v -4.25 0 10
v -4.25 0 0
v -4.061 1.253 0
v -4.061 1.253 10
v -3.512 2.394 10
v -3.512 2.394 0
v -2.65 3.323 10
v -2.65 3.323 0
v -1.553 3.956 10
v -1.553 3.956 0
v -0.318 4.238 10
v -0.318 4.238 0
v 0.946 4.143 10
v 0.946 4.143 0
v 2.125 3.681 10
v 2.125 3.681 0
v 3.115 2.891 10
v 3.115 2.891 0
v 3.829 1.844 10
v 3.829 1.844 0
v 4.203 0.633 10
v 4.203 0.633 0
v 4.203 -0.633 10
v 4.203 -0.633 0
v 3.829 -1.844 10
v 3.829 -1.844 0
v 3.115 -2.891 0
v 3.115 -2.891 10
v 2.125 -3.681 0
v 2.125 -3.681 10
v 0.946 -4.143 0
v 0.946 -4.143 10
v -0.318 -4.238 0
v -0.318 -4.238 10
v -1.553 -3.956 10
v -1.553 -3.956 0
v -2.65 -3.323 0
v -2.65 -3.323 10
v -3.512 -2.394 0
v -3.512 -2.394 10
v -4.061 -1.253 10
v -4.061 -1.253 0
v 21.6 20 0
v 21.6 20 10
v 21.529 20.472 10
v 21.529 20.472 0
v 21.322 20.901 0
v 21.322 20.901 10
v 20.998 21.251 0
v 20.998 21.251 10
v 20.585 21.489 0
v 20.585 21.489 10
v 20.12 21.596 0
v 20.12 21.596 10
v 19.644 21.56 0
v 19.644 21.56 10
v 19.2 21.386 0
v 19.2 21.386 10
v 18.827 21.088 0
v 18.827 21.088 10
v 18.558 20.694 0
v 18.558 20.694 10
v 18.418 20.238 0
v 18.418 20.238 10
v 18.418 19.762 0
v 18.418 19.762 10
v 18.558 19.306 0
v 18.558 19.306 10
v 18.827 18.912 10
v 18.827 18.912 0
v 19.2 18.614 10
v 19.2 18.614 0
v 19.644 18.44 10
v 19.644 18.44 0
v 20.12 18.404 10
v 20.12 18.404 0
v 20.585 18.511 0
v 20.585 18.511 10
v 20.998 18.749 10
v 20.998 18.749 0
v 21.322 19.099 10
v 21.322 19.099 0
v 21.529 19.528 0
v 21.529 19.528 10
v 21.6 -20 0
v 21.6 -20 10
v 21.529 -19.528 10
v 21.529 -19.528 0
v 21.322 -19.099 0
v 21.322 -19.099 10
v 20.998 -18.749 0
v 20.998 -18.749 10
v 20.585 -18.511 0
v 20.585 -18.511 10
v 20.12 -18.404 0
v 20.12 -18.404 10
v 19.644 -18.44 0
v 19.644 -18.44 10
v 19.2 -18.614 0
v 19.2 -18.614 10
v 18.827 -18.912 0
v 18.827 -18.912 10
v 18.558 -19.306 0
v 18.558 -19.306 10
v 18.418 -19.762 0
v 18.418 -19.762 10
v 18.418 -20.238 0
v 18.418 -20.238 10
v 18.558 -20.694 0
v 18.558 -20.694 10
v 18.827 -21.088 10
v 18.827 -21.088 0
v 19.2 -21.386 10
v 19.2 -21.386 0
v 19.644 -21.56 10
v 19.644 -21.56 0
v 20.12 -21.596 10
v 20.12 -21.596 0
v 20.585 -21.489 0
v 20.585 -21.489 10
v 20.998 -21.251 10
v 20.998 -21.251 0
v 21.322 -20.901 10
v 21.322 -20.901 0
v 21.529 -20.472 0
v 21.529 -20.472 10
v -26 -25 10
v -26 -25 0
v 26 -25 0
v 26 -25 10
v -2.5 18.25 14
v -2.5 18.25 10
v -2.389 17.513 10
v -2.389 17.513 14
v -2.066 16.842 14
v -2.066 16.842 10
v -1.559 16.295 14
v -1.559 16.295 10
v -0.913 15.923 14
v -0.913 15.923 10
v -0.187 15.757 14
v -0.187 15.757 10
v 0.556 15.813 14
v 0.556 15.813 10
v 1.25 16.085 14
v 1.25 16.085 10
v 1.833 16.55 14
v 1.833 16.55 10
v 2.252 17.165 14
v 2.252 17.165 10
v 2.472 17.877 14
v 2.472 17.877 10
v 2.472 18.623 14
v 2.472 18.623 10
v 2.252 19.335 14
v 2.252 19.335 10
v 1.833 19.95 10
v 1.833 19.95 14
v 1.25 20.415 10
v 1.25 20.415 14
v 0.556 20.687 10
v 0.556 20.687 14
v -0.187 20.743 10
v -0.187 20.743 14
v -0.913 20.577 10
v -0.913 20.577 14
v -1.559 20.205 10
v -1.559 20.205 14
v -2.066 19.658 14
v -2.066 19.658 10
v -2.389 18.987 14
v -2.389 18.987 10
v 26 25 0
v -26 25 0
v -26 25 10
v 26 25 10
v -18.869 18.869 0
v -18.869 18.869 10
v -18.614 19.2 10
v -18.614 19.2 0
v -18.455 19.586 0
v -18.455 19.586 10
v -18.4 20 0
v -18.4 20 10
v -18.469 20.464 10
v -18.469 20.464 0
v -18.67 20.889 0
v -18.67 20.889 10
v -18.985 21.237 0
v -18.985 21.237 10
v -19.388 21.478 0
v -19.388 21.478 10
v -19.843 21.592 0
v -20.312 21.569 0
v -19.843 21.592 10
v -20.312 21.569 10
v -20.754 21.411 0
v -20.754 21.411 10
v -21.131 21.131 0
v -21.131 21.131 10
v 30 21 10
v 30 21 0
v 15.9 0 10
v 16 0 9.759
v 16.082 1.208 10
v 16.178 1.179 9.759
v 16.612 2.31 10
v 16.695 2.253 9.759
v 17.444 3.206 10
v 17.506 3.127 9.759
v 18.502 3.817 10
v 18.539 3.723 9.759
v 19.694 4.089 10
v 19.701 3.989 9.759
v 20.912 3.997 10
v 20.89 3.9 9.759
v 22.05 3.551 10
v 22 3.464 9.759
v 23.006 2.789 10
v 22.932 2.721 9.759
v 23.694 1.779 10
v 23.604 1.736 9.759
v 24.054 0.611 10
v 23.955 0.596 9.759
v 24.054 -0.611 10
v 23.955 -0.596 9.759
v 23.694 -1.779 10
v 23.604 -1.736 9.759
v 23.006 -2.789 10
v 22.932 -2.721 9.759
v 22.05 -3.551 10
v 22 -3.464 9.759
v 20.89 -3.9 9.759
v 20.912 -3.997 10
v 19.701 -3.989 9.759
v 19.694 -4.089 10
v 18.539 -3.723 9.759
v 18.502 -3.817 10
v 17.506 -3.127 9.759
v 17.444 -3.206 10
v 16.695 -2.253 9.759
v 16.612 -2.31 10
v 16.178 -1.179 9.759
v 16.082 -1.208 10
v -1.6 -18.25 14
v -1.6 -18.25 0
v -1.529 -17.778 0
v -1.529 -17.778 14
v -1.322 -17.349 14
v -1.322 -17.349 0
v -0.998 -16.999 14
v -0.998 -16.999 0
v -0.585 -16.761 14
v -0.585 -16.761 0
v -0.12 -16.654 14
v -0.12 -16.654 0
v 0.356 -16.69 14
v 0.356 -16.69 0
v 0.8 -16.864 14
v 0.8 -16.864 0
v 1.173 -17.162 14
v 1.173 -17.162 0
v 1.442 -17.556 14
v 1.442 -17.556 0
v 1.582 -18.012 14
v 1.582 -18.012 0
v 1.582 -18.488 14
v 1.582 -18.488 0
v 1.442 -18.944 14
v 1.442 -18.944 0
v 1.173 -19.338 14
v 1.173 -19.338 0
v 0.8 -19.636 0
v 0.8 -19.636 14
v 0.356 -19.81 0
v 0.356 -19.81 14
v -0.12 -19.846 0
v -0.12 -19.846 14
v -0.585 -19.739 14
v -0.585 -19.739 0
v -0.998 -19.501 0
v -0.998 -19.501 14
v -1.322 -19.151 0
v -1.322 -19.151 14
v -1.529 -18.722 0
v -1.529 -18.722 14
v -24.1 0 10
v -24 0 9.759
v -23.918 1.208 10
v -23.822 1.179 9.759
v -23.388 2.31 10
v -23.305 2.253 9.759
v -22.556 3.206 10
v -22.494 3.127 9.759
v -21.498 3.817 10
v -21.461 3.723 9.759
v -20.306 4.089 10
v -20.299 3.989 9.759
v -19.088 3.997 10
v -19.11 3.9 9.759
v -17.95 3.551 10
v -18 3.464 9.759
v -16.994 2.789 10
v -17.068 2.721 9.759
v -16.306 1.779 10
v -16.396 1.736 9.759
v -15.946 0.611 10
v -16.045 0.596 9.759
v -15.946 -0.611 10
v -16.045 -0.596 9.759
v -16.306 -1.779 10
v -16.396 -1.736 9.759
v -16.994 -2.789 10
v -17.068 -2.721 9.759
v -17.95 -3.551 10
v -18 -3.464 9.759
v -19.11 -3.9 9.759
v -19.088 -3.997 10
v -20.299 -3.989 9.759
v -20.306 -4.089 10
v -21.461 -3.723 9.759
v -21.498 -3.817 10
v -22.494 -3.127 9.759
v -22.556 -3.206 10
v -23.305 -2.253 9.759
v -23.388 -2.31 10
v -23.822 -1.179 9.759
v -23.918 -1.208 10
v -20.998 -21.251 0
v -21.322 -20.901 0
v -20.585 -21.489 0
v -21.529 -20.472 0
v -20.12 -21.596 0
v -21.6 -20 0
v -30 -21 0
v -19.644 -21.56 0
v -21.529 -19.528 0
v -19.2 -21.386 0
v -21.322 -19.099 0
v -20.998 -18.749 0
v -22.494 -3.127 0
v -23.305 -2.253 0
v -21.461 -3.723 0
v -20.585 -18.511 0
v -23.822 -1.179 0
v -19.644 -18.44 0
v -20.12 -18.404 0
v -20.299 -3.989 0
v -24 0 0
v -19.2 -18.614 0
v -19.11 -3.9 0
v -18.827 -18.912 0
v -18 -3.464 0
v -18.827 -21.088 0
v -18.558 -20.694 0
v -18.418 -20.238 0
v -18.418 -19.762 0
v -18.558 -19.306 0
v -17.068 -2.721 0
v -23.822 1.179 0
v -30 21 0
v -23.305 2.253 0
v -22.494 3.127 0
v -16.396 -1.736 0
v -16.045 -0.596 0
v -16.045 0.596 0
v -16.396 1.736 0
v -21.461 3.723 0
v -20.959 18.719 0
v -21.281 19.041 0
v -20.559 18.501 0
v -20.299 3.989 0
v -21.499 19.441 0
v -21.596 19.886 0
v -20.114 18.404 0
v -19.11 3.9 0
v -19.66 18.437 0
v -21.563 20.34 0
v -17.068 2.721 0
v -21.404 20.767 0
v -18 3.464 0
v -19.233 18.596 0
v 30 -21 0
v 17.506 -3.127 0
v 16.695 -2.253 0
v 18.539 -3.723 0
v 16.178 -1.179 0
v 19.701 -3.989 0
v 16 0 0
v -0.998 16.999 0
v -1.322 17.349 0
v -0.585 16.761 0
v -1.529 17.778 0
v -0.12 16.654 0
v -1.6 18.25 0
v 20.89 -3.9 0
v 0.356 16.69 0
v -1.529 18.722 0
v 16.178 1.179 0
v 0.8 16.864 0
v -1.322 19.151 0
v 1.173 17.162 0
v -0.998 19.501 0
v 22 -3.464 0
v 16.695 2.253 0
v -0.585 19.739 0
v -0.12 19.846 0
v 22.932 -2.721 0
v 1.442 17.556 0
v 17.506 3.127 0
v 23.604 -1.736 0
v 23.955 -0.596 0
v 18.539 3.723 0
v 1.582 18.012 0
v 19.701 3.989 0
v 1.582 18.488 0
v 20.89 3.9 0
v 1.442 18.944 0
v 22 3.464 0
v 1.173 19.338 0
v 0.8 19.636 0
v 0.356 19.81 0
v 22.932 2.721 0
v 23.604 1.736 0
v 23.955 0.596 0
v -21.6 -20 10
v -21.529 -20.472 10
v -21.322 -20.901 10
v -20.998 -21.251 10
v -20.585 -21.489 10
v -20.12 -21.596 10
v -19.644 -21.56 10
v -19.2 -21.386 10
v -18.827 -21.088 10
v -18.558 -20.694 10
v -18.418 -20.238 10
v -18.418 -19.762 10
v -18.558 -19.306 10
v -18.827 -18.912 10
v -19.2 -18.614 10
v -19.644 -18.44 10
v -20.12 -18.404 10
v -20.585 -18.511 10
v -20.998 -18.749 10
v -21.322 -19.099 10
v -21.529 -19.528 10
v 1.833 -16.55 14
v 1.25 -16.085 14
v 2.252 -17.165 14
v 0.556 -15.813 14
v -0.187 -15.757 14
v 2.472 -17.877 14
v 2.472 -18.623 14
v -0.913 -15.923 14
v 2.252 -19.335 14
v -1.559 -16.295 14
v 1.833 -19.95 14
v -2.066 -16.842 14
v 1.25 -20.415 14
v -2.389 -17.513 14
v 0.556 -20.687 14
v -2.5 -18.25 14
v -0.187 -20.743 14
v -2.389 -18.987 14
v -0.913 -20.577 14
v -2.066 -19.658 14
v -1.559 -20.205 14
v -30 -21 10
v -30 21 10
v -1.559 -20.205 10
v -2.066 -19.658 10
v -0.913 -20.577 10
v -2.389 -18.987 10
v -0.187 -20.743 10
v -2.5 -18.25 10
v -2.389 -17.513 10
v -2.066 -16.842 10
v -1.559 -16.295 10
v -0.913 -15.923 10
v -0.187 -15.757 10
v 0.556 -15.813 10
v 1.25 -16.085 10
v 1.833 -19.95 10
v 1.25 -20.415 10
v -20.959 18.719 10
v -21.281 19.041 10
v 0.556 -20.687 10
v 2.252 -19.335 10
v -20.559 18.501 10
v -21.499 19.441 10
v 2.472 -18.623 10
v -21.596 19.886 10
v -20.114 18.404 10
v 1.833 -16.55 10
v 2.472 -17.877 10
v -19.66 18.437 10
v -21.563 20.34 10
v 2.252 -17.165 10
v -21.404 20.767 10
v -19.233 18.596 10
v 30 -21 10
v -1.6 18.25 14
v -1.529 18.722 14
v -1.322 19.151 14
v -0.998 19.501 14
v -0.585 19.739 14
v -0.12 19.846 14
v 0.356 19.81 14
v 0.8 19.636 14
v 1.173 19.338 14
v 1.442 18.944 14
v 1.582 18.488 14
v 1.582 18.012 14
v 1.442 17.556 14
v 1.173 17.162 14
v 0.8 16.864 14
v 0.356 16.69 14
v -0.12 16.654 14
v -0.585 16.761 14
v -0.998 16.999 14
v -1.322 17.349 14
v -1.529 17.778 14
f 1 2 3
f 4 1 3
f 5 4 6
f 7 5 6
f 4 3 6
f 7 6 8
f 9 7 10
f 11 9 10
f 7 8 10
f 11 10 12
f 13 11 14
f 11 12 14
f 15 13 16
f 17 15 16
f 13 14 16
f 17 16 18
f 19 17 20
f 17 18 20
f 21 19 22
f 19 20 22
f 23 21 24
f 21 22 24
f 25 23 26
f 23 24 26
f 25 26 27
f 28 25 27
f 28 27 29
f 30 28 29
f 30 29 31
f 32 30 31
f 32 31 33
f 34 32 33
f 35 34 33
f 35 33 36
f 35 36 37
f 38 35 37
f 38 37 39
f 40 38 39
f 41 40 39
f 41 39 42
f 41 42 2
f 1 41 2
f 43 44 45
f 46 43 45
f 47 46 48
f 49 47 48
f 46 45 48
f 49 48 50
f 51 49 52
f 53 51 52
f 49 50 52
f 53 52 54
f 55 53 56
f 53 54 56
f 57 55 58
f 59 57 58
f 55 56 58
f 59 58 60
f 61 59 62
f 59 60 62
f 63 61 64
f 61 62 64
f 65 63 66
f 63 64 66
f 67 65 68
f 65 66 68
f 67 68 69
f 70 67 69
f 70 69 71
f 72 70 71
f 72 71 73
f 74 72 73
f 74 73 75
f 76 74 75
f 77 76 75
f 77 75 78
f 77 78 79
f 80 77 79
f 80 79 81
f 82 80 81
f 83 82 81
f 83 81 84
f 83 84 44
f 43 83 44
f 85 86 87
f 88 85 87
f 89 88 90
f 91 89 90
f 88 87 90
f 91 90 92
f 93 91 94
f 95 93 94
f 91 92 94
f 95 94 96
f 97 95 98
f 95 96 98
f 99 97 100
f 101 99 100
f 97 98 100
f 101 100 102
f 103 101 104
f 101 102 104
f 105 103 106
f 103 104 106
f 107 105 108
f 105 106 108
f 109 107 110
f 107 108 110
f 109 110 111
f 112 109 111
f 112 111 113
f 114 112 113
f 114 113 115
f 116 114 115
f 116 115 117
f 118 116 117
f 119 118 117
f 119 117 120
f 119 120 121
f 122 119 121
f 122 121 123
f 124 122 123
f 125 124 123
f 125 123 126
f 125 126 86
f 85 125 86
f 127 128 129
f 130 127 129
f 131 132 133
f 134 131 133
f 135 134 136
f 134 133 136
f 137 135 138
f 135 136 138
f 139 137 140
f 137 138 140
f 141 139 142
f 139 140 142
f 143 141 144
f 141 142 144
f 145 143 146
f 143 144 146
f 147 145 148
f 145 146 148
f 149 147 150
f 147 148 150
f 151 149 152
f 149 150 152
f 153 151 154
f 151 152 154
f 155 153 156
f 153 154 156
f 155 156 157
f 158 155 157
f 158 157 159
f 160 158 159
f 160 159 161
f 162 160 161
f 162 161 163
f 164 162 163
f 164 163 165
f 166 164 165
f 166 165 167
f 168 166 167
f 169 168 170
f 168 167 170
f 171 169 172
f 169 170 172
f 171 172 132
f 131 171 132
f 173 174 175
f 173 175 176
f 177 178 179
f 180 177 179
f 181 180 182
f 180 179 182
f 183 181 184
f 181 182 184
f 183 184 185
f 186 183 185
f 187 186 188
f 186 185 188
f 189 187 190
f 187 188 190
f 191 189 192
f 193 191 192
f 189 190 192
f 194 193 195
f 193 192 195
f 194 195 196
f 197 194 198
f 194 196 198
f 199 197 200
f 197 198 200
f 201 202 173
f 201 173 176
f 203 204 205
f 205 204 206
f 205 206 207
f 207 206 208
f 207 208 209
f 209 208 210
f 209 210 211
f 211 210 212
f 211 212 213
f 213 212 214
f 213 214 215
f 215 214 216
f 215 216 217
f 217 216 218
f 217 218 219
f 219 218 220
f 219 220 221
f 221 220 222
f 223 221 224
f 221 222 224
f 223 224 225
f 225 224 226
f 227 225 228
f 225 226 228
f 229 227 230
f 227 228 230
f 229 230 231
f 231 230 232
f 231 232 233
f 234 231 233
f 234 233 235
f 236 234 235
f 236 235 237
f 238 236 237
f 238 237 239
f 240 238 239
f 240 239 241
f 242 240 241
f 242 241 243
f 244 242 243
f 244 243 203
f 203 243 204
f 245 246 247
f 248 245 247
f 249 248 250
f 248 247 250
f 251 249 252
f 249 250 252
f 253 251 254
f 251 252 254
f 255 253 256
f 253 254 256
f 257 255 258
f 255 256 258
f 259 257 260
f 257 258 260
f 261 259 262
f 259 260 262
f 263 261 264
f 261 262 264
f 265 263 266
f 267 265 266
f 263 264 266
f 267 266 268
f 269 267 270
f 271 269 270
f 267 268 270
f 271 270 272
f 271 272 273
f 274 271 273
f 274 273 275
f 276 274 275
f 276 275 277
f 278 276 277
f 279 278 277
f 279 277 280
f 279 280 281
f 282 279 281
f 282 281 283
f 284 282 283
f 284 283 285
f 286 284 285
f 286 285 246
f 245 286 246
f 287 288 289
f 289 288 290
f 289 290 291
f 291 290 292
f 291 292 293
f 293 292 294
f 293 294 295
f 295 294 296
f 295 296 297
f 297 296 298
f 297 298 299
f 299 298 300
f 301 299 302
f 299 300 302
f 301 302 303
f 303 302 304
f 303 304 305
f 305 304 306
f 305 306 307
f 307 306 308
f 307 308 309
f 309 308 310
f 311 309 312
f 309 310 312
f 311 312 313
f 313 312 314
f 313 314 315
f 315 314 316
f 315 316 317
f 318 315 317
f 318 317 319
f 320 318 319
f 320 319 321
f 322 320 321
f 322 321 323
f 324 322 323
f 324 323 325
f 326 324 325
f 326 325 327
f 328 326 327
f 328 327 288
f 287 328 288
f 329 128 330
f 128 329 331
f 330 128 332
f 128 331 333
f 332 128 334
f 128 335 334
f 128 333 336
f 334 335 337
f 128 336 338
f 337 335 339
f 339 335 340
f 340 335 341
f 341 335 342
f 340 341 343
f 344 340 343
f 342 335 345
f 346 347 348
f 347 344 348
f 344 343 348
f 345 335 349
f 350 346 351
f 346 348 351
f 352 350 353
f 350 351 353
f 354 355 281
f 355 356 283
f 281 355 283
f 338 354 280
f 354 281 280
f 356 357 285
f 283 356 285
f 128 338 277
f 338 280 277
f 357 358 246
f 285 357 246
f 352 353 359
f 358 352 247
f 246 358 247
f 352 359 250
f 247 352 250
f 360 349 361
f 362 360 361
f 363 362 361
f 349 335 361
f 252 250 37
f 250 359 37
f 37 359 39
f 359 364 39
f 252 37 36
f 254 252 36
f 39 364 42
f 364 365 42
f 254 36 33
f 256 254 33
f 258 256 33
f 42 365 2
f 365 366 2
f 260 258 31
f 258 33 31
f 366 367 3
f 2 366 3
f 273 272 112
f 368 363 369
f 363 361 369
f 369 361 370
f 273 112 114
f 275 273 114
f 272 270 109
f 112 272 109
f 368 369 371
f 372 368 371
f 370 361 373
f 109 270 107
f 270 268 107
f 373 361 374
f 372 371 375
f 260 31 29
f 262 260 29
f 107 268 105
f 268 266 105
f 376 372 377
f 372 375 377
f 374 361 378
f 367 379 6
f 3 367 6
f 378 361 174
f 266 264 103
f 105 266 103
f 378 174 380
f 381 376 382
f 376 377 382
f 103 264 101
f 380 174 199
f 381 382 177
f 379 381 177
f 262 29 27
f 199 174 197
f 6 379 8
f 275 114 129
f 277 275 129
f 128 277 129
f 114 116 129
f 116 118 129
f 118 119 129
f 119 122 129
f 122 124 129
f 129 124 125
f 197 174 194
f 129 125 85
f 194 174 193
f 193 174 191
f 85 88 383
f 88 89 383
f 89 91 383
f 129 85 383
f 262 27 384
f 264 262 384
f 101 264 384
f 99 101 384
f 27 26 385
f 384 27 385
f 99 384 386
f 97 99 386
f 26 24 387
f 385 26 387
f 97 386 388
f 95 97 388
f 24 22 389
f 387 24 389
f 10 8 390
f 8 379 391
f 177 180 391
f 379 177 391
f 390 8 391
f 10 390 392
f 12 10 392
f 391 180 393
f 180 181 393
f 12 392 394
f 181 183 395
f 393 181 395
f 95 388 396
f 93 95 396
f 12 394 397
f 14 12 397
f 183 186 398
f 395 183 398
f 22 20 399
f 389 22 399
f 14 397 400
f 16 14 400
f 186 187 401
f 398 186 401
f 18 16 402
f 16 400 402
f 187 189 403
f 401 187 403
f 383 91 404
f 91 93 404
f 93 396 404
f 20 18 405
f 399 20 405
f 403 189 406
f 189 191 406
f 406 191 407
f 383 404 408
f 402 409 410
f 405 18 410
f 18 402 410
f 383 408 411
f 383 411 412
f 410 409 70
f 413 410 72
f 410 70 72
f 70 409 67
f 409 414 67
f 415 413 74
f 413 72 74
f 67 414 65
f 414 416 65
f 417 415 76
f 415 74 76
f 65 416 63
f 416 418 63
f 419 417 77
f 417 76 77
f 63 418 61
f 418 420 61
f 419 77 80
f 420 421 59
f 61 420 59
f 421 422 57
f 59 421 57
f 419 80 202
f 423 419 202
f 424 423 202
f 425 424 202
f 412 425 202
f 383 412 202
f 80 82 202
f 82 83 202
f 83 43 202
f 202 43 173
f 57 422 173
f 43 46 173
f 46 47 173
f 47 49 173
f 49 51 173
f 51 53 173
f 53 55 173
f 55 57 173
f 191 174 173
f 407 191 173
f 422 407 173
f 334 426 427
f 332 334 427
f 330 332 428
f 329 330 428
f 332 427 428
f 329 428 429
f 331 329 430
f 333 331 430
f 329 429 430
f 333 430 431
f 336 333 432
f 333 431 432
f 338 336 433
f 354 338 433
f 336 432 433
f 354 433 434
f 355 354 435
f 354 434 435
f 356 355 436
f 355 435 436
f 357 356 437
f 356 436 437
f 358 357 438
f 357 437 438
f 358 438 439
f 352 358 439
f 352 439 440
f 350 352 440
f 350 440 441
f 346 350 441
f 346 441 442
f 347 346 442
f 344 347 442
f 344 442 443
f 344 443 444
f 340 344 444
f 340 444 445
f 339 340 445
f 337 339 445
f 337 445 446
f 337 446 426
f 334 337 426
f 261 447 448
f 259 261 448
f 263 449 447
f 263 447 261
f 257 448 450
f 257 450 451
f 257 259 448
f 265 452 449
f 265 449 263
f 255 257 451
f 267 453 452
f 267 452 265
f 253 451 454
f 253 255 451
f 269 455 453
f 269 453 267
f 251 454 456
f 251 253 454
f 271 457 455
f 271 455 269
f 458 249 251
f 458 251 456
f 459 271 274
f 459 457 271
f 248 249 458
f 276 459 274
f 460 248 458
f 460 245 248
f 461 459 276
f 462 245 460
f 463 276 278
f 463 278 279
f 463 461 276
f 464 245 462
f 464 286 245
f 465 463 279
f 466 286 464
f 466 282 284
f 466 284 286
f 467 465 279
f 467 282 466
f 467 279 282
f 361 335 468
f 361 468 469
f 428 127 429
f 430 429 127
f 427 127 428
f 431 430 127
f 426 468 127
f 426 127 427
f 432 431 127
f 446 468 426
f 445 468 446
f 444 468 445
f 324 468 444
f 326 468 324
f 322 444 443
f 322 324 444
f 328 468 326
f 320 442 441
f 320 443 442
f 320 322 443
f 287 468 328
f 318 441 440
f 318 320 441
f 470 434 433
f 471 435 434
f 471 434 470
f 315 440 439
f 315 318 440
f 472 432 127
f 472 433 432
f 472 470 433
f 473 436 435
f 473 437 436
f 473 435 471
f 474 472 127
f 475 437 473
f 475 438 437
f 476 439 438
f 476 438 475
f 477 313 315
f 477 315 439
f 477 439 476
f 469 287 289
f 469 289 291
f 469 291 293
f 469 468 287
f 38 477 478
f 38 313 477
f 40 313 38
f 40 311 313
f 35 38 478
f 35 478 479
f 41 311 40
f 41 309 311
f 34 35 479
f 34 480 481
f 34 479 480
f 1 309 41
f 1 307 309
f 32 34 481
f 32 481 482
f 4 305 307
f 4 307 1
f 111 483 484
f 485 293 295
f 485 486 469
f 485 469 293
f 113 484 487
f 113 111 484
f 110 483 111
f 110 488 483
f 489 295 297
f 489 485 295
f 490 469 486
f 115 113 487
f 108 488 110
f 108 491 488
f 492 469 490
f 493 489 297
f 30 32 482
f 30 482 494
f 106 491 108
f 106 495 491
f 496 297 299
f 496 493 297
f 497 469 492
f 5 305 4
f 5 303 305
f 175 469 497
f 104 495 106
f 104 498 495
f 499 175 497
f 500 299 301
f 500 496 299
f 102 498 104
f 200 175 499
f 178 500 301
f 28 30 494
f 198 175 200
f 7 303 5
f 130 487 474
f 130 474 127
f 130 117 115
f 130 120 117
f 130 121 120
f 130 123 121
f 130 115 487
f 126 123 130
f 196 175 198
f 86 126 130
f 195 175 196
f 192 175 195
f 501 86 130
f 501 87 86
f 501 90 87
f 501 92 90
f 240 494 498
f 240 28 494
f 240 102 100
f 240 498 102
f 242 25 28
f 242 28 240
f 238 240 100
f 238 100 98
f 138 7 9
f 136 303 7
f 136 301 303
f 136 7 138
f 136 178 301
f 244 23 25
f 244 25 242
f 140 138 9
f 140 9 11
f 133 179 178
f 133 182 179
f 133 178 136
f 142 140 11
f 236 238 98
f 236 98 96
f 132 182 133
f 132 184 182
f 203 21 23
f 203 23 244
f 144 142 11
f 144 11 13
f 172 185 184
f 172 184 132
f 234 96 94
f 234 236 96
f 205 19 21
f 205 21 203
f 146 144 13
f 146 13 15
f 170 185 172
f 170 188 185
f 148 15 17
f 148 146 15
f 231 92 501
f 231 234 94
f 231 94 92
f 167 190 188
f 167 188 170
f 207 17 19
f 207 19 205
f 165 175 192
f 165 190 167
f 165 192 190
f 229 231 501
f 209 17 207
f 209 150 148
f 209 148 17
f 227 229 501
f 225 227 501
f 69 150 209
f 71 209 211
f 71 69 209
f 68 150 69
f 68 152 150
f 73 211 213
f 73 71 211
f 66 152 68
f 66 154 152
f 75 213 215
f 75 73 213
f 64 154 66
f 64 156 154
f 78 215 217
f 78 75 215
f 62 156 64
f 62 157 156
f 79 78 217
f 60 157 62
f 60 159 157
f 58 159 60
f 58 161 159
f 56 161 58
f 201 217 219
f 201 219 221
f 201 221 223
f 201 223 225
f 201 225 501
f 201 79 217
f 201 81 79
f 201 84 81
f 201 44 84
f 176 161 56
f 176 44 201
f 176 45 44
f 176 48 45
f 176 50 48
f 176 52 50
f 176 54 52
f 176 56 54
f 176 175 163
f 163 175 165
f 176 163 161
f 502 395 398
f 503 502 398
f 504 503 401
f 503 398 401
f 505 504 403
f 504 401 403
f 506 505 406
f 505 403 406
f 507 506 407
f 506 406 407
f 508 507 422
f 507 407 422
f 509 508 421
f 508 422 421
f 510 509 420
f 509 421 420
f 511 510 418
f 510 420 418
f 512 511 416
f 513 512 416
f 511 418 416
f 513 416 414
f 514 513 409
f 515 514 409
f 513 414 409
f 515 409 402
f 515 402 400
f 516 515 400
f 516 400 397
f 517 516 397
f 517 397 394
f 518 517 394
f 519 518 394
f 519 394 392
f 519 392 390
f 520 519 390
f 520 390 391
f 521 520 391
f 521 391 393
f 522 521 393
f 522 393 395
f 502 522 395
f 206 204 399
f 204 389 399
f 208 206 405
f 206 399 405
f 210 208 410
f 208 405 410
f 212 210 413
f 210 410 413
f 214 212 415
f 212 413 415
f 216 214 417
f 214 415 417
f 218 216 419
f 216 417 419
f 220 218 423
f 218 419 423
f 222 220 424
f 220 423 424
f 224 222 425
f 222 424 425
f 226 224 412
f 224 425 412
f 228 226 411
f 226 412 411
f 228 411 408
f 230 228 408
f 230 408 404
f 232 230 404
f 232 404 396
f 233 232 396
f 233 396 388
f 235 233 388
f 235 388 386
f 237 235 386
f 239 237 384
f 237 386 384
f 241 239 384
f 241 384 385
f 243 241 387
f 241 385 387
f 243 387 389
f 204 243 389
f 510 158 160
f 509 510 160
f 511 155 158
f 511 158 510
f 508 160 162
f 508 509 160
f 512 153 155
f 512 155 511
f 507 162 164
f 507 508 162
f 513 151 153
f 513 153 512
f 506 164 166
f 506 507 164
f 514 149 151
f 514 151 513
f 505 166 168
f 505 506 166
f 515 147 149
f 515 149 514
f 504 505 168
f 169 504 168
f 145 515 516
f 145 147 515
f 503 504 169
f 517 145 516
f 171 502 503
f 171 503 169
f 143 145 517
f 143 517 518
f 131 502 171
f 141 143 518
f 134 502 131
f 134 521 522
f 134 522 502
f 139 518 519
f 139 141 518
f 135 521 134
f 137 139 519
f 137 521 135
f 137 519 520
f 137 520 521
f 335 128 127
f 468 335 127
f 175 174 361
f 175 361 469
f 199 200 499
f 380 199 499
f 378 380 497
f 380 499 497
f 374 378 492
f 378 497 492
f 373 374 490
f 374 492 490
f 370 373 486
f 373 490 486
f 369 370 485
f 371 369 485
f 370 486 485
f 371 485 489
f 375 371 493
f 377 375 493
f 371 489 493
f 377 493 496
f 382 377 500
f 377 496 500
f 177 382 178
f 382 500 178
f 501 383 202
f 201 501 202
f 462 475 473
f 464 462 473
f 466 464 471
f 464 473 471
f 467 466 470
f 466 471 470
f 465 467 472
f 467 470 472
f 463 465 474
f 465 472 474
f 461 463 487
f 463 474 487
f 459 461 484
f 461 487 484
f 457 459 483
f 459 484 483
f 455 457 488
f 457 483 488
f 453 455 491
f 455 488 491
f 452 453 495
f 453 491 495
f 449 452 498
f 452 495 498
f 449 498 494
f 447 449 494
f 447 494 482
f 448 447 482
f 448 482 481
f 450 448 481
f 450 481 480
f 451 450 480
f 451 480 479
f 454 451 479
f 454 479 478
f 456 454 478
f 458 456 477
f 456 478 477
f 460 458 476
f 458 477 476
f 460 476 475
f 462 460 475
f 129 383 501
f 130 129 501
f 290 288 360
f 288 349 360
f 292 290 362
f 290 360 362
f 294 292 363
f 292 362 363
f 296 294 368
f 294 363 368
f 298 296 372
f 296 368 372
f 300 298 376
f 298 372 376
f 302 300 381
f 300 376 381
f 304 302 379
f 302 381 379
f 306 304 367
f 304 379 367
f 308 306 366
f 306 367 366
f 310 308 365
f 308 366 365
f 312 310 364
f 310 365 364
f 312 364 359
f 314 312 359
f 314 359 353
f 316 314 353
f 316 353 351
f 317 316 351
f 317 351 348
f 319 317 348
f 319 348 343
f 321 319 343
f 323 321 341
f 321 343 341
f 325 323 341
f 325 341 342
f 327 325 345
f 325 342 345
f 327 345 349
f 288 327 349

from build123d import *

# Parameters (mm, degrees)
SKETCH_1_W                = 60
SKETCH_1_H                = 50
EXTRUDE_1_DEPTH           = 10
HOLE_WIZARD_1_D           = 8.5
HOLE_WIZARD_1_DEPTH       = 20
HOLE_WIZARD_2_D           = 8
HOLE_WIZARD_2_CSINK_D     = 8.2
HOLE_WIZARD_2_CSINK_ANGLE = 45
SKETCH_9_R                = 2.5
EXTRUDE_3_DEPTH           = 4
HOLE_WIZARD_3_D           = 3.2
CHAMFER_1_SIZE            = 4
SKETCH_15_R               = 1.6
CUT_EXTRUDE_1_DEPTH       = 41.311288741


with BuildPart() as part:
    # 草图1 → 凸台-拉伸1 (new body)
    with BuildSketch(Plane.XY):
        Rectangle(SKETCH_1_W, SKETCH_1_H)
    extrude(amount=EXTRUDE_1_DEPTH)

    # 孔1
    with Locations(Plane.XY.offset(10)):
        with Locations((0, 0)):
            Hole(HOLE_WIZARD_1_D / 2, depth=HOLE_WIZARD_1_DEPTH)

    # 孔2 (through all)
    with Locations(Plane.XY.offset(10)):
        with Locations((20, 0), (-20, 0)):
            CounterSinkHole(HOLE_WIZARD_2_D / 2, HOLE_WIZARD_2_CSINK_D / 2, counter_sink_angle=HOLE_WIZARD_2_CSINK_ANGLE)

    # 草图9 → 凸台-拉伸3 (add)
    with BuildSketch(Plane.XY.offset(10)):
        with Locations(Location((0, 18.25, 0), (0, 0, 180))):
            Circle(SKETCH_9_R)
        with Locations(Location((0, -18.25, 0), (0, 0, 180))):
            Circle(SKETCH_9_R)
    extrude(amount=EXTRUDE_3_DEPTH)

    # 孔3 (through all)
    with Locations(Plane.XY.offset(14)):
        with Locations((0, 18.25), (0, -18.25)):
            Hole(HOLE_WIZARD_3_D / 2)

    # 倒角1
    chamfer_1_edges = [part.edges().sort_by_distance(p)[0] for p in [
        (30, -25, 5),
        (-30, -25, 5),
        (-30, 25, 5),
        (30, 25, 5),
    ]]
    chamfer(chamfer_1_edges, length=CHAMFER_1_SIZE)

    # 草图15 → 切除-拉伸1 (cut, through all)
    with BuildSketch(Plane.XY.offset(10)):
        with BuildLine():
            ThreePointArc((-21.13137085, 21.13137085), (-21.13137085, 18.86862915), (-18.86862915, 18.86862915))
            Line((-18.86862915, 18.86862915), (-21.13137085, 21.13137085))
        make_face()
        with BuildLine():
            Line((-21.13137085, 21.13137085), (-18.86862915, 18.86862915))
            ThreePointArc((-18.86862915, 18.86862915), (-18.521792748, 19.387706508), (-18.4, 20))
            ThreePointArc((-18.4, 20), (-19.387706508, 21.478207252), (-21.13137085, 21.13137085))
        make_face()
        with Locations((20, 20)):
            Circle(SKETCH_15_R)
        with Locations((20, -20)):
            Circle(SKETCH_15_R)
        with Locations(Location((-20, -20, 0), (0, 0, 180))):
            Circle(SKETCH_15_R)
    extrude(amount=-CUT_EXTRUDE_1_DEPTH, mode=Mode.SUBTRACT)


solid = part.part
